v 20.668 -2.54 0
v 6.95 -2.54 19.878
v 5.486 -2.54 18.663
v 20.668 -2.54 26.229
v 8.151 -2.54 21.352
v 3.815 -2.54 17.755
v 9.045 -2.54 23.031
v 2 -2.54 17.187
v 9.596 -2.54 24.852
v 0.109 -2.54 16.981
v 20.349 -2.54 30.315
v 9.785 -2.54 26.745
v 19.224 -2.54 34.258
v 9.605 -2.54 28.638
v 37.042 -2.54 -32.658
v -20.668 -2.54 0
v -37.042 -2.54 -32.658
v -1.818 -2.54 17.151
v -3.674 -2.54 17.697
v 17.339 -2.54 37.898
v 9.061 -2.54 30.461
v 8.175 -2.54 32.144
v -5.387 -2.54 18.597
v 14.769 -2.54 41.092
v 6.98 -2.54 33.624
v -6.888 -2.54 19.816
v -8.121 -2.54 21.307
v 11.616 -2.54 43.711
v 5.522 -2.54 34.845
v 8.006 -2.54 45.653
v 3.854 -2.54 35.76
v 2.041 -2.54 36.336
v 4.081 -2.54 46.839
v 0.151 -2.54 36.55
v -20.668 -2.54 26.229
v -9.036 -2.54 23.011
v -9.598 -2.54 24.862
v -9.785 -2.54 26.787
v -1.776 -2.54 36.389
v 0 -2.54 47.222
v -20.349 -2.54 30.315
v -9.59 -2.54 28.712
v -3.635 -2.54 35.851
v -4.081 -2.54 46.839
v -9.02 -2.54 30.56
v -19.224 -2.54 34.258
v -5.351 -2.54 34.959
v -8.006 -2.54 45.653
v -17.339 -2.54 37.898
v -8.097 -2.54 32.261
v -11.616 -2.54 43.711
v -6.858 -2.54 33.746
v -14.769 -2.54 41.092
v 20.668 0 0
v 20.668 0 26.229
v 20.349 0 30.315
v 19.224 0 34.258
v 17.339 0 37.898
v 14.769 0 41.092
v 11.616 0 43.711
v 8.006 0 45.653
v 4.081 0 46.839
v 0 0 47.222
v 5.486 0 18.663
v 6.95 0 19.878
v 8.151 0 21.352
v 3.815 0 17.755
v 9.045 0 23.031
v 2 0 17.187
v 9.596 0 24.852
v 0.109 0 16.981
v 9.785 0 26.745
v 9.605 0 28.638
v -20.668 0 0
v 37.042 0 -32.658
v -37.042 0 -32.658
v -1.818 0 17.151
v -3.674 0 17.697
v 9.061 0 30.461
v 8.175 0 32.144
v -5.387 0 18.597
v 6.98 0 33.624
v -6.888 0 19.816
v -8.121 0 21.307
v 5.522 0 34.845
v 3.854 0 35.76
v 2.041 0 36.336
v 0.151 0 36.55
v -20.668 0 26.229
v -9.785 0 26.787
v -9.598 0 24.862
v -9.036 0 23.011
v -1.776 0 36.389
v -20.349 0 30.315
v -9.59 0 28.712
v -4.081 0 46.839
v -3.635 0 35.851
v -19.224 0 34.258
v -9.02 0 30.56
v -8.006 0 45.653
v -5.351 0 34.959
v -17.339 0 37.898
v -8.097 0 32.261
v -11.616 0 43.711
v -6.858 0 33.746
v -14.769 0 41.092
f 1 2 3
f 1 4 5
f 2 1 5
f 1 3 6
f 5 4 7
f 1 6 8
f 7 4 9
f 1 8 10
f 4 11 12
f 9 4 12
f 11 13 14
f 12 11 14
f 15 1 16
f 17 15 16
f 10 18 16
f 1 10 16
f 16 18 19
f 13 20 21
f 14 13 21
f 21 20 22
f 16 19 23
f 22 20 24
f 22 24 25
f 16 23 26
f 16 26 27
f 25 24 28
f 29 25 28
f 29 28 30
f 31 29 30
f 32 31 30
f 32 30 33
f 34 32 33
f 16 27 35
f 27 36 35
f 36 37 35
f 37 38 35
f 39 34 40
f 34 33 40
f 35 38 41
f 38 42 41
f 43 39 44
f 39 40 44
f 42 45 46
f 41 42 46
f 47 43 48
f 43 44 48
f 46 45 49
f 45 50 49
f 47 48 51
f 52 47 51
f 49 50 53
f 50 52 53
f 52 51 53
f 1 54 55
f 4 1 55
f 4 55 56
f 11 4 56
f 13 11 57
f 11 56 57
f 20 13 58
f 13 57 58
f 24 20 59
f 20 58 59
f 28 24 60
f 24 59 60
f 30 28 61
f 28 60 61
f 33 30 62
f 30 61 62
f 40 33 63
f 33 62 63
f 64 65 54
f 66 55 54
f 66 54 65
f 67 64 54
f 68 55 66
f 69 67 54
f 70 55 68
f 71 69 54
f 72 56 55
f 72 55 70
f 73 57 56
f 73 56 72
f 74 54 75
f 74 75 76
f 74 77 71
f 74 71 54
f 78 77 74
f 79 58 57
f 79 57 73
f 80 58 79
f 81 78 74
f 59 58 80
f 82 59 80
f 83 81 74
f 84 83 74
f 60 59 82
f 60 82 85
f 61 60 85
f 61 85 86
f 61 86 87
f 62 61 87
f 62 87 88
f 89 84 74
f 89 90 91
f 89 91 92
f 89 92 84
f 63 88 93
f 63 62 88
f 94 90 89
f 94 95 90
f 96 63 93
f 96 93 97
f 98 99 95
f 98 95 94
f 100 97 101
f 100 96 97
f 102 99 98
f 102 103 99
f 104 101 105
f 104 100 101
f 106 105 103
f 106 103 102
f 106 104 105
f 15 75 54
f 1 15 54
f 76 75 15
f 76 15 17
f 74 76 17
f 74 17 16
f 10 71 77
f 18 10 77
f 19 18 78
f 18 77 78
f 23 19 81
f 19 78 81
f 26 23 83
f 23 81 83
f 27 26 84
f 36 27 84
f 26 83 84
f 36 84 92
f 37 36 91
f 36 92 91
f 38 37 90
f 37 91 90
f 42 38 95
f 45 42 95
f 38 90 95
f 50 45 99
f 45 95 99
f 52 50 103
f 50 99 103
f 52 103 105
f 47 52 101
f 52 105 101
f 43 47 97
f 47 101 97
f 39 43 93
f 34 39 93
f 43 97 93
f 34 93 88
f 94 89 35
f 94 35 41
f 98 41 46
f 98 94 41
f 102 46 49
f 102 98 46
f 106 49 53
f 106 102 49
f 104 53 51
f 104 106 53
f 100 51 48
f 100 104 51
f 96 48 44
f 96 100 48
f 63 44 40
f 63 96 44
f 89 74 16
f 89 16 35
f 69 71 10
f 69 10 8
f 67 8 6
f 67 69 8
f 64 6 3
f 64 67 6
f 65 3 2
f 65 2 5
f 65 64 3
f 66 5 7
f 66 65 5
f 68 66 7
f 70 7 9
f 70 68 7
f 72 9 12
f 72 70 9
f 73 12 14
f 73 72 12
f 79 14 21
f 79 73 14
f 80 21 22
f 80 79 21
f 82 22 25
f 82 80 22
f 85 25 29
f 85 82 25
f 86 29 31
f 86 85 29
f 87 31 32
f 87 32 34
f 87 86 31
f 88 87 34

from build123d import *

# Parameters (mm, degrees)
F1_DEPTH = 2.54


with BuildPart() as f1:
    # F0 (on Front) → F1 (new body)
    with BuildSketch(Plane.XZ):
        with BuildLine():
            Line((20.668315, 0), (20.668315, 26.228523))
            ThreePointArc((20.668315, 26.228523), (0.17472, 47.222494), (-20.410517, 26.318373))
            ThreePointArc((-20.410517, 26.318373), (-20.409678, 26.273447), (-20.408742, 26.228523))
            Line((-20.408742, 26.228523), (-19.833371, 0))
            Line((-19.833371, 0), (-36.207609, -32.658167))
            Line((-36.207609, -32.658167), (37.04169, -32.658167))
            Line((37.04169, -32.658167), (20.668315, 0))
        make_face()
        with BuildLine():
            ThreePointArc((0.108574, 16.981143), (-9.785373, 26.78734), (0.151377, 36.550163))
            ThreePointArc((0.151377, 36.550163), (7.140778, 33.72297), (10.045348, 26.765368))
            ThreePointArc((10.045348, 26.765368), (7.125543, 19.792734), (0.108574, 16.981143))
        make_face(mode=Mode.SUBTRACT)
    extrude(amount=F1_DEPTH)

    # F2: F1 across plane


with BuildPart() as f1_1:
    add(f1.part)
    add(f1.part.mirror(Plane.YZ))


solid = f1_1.part
